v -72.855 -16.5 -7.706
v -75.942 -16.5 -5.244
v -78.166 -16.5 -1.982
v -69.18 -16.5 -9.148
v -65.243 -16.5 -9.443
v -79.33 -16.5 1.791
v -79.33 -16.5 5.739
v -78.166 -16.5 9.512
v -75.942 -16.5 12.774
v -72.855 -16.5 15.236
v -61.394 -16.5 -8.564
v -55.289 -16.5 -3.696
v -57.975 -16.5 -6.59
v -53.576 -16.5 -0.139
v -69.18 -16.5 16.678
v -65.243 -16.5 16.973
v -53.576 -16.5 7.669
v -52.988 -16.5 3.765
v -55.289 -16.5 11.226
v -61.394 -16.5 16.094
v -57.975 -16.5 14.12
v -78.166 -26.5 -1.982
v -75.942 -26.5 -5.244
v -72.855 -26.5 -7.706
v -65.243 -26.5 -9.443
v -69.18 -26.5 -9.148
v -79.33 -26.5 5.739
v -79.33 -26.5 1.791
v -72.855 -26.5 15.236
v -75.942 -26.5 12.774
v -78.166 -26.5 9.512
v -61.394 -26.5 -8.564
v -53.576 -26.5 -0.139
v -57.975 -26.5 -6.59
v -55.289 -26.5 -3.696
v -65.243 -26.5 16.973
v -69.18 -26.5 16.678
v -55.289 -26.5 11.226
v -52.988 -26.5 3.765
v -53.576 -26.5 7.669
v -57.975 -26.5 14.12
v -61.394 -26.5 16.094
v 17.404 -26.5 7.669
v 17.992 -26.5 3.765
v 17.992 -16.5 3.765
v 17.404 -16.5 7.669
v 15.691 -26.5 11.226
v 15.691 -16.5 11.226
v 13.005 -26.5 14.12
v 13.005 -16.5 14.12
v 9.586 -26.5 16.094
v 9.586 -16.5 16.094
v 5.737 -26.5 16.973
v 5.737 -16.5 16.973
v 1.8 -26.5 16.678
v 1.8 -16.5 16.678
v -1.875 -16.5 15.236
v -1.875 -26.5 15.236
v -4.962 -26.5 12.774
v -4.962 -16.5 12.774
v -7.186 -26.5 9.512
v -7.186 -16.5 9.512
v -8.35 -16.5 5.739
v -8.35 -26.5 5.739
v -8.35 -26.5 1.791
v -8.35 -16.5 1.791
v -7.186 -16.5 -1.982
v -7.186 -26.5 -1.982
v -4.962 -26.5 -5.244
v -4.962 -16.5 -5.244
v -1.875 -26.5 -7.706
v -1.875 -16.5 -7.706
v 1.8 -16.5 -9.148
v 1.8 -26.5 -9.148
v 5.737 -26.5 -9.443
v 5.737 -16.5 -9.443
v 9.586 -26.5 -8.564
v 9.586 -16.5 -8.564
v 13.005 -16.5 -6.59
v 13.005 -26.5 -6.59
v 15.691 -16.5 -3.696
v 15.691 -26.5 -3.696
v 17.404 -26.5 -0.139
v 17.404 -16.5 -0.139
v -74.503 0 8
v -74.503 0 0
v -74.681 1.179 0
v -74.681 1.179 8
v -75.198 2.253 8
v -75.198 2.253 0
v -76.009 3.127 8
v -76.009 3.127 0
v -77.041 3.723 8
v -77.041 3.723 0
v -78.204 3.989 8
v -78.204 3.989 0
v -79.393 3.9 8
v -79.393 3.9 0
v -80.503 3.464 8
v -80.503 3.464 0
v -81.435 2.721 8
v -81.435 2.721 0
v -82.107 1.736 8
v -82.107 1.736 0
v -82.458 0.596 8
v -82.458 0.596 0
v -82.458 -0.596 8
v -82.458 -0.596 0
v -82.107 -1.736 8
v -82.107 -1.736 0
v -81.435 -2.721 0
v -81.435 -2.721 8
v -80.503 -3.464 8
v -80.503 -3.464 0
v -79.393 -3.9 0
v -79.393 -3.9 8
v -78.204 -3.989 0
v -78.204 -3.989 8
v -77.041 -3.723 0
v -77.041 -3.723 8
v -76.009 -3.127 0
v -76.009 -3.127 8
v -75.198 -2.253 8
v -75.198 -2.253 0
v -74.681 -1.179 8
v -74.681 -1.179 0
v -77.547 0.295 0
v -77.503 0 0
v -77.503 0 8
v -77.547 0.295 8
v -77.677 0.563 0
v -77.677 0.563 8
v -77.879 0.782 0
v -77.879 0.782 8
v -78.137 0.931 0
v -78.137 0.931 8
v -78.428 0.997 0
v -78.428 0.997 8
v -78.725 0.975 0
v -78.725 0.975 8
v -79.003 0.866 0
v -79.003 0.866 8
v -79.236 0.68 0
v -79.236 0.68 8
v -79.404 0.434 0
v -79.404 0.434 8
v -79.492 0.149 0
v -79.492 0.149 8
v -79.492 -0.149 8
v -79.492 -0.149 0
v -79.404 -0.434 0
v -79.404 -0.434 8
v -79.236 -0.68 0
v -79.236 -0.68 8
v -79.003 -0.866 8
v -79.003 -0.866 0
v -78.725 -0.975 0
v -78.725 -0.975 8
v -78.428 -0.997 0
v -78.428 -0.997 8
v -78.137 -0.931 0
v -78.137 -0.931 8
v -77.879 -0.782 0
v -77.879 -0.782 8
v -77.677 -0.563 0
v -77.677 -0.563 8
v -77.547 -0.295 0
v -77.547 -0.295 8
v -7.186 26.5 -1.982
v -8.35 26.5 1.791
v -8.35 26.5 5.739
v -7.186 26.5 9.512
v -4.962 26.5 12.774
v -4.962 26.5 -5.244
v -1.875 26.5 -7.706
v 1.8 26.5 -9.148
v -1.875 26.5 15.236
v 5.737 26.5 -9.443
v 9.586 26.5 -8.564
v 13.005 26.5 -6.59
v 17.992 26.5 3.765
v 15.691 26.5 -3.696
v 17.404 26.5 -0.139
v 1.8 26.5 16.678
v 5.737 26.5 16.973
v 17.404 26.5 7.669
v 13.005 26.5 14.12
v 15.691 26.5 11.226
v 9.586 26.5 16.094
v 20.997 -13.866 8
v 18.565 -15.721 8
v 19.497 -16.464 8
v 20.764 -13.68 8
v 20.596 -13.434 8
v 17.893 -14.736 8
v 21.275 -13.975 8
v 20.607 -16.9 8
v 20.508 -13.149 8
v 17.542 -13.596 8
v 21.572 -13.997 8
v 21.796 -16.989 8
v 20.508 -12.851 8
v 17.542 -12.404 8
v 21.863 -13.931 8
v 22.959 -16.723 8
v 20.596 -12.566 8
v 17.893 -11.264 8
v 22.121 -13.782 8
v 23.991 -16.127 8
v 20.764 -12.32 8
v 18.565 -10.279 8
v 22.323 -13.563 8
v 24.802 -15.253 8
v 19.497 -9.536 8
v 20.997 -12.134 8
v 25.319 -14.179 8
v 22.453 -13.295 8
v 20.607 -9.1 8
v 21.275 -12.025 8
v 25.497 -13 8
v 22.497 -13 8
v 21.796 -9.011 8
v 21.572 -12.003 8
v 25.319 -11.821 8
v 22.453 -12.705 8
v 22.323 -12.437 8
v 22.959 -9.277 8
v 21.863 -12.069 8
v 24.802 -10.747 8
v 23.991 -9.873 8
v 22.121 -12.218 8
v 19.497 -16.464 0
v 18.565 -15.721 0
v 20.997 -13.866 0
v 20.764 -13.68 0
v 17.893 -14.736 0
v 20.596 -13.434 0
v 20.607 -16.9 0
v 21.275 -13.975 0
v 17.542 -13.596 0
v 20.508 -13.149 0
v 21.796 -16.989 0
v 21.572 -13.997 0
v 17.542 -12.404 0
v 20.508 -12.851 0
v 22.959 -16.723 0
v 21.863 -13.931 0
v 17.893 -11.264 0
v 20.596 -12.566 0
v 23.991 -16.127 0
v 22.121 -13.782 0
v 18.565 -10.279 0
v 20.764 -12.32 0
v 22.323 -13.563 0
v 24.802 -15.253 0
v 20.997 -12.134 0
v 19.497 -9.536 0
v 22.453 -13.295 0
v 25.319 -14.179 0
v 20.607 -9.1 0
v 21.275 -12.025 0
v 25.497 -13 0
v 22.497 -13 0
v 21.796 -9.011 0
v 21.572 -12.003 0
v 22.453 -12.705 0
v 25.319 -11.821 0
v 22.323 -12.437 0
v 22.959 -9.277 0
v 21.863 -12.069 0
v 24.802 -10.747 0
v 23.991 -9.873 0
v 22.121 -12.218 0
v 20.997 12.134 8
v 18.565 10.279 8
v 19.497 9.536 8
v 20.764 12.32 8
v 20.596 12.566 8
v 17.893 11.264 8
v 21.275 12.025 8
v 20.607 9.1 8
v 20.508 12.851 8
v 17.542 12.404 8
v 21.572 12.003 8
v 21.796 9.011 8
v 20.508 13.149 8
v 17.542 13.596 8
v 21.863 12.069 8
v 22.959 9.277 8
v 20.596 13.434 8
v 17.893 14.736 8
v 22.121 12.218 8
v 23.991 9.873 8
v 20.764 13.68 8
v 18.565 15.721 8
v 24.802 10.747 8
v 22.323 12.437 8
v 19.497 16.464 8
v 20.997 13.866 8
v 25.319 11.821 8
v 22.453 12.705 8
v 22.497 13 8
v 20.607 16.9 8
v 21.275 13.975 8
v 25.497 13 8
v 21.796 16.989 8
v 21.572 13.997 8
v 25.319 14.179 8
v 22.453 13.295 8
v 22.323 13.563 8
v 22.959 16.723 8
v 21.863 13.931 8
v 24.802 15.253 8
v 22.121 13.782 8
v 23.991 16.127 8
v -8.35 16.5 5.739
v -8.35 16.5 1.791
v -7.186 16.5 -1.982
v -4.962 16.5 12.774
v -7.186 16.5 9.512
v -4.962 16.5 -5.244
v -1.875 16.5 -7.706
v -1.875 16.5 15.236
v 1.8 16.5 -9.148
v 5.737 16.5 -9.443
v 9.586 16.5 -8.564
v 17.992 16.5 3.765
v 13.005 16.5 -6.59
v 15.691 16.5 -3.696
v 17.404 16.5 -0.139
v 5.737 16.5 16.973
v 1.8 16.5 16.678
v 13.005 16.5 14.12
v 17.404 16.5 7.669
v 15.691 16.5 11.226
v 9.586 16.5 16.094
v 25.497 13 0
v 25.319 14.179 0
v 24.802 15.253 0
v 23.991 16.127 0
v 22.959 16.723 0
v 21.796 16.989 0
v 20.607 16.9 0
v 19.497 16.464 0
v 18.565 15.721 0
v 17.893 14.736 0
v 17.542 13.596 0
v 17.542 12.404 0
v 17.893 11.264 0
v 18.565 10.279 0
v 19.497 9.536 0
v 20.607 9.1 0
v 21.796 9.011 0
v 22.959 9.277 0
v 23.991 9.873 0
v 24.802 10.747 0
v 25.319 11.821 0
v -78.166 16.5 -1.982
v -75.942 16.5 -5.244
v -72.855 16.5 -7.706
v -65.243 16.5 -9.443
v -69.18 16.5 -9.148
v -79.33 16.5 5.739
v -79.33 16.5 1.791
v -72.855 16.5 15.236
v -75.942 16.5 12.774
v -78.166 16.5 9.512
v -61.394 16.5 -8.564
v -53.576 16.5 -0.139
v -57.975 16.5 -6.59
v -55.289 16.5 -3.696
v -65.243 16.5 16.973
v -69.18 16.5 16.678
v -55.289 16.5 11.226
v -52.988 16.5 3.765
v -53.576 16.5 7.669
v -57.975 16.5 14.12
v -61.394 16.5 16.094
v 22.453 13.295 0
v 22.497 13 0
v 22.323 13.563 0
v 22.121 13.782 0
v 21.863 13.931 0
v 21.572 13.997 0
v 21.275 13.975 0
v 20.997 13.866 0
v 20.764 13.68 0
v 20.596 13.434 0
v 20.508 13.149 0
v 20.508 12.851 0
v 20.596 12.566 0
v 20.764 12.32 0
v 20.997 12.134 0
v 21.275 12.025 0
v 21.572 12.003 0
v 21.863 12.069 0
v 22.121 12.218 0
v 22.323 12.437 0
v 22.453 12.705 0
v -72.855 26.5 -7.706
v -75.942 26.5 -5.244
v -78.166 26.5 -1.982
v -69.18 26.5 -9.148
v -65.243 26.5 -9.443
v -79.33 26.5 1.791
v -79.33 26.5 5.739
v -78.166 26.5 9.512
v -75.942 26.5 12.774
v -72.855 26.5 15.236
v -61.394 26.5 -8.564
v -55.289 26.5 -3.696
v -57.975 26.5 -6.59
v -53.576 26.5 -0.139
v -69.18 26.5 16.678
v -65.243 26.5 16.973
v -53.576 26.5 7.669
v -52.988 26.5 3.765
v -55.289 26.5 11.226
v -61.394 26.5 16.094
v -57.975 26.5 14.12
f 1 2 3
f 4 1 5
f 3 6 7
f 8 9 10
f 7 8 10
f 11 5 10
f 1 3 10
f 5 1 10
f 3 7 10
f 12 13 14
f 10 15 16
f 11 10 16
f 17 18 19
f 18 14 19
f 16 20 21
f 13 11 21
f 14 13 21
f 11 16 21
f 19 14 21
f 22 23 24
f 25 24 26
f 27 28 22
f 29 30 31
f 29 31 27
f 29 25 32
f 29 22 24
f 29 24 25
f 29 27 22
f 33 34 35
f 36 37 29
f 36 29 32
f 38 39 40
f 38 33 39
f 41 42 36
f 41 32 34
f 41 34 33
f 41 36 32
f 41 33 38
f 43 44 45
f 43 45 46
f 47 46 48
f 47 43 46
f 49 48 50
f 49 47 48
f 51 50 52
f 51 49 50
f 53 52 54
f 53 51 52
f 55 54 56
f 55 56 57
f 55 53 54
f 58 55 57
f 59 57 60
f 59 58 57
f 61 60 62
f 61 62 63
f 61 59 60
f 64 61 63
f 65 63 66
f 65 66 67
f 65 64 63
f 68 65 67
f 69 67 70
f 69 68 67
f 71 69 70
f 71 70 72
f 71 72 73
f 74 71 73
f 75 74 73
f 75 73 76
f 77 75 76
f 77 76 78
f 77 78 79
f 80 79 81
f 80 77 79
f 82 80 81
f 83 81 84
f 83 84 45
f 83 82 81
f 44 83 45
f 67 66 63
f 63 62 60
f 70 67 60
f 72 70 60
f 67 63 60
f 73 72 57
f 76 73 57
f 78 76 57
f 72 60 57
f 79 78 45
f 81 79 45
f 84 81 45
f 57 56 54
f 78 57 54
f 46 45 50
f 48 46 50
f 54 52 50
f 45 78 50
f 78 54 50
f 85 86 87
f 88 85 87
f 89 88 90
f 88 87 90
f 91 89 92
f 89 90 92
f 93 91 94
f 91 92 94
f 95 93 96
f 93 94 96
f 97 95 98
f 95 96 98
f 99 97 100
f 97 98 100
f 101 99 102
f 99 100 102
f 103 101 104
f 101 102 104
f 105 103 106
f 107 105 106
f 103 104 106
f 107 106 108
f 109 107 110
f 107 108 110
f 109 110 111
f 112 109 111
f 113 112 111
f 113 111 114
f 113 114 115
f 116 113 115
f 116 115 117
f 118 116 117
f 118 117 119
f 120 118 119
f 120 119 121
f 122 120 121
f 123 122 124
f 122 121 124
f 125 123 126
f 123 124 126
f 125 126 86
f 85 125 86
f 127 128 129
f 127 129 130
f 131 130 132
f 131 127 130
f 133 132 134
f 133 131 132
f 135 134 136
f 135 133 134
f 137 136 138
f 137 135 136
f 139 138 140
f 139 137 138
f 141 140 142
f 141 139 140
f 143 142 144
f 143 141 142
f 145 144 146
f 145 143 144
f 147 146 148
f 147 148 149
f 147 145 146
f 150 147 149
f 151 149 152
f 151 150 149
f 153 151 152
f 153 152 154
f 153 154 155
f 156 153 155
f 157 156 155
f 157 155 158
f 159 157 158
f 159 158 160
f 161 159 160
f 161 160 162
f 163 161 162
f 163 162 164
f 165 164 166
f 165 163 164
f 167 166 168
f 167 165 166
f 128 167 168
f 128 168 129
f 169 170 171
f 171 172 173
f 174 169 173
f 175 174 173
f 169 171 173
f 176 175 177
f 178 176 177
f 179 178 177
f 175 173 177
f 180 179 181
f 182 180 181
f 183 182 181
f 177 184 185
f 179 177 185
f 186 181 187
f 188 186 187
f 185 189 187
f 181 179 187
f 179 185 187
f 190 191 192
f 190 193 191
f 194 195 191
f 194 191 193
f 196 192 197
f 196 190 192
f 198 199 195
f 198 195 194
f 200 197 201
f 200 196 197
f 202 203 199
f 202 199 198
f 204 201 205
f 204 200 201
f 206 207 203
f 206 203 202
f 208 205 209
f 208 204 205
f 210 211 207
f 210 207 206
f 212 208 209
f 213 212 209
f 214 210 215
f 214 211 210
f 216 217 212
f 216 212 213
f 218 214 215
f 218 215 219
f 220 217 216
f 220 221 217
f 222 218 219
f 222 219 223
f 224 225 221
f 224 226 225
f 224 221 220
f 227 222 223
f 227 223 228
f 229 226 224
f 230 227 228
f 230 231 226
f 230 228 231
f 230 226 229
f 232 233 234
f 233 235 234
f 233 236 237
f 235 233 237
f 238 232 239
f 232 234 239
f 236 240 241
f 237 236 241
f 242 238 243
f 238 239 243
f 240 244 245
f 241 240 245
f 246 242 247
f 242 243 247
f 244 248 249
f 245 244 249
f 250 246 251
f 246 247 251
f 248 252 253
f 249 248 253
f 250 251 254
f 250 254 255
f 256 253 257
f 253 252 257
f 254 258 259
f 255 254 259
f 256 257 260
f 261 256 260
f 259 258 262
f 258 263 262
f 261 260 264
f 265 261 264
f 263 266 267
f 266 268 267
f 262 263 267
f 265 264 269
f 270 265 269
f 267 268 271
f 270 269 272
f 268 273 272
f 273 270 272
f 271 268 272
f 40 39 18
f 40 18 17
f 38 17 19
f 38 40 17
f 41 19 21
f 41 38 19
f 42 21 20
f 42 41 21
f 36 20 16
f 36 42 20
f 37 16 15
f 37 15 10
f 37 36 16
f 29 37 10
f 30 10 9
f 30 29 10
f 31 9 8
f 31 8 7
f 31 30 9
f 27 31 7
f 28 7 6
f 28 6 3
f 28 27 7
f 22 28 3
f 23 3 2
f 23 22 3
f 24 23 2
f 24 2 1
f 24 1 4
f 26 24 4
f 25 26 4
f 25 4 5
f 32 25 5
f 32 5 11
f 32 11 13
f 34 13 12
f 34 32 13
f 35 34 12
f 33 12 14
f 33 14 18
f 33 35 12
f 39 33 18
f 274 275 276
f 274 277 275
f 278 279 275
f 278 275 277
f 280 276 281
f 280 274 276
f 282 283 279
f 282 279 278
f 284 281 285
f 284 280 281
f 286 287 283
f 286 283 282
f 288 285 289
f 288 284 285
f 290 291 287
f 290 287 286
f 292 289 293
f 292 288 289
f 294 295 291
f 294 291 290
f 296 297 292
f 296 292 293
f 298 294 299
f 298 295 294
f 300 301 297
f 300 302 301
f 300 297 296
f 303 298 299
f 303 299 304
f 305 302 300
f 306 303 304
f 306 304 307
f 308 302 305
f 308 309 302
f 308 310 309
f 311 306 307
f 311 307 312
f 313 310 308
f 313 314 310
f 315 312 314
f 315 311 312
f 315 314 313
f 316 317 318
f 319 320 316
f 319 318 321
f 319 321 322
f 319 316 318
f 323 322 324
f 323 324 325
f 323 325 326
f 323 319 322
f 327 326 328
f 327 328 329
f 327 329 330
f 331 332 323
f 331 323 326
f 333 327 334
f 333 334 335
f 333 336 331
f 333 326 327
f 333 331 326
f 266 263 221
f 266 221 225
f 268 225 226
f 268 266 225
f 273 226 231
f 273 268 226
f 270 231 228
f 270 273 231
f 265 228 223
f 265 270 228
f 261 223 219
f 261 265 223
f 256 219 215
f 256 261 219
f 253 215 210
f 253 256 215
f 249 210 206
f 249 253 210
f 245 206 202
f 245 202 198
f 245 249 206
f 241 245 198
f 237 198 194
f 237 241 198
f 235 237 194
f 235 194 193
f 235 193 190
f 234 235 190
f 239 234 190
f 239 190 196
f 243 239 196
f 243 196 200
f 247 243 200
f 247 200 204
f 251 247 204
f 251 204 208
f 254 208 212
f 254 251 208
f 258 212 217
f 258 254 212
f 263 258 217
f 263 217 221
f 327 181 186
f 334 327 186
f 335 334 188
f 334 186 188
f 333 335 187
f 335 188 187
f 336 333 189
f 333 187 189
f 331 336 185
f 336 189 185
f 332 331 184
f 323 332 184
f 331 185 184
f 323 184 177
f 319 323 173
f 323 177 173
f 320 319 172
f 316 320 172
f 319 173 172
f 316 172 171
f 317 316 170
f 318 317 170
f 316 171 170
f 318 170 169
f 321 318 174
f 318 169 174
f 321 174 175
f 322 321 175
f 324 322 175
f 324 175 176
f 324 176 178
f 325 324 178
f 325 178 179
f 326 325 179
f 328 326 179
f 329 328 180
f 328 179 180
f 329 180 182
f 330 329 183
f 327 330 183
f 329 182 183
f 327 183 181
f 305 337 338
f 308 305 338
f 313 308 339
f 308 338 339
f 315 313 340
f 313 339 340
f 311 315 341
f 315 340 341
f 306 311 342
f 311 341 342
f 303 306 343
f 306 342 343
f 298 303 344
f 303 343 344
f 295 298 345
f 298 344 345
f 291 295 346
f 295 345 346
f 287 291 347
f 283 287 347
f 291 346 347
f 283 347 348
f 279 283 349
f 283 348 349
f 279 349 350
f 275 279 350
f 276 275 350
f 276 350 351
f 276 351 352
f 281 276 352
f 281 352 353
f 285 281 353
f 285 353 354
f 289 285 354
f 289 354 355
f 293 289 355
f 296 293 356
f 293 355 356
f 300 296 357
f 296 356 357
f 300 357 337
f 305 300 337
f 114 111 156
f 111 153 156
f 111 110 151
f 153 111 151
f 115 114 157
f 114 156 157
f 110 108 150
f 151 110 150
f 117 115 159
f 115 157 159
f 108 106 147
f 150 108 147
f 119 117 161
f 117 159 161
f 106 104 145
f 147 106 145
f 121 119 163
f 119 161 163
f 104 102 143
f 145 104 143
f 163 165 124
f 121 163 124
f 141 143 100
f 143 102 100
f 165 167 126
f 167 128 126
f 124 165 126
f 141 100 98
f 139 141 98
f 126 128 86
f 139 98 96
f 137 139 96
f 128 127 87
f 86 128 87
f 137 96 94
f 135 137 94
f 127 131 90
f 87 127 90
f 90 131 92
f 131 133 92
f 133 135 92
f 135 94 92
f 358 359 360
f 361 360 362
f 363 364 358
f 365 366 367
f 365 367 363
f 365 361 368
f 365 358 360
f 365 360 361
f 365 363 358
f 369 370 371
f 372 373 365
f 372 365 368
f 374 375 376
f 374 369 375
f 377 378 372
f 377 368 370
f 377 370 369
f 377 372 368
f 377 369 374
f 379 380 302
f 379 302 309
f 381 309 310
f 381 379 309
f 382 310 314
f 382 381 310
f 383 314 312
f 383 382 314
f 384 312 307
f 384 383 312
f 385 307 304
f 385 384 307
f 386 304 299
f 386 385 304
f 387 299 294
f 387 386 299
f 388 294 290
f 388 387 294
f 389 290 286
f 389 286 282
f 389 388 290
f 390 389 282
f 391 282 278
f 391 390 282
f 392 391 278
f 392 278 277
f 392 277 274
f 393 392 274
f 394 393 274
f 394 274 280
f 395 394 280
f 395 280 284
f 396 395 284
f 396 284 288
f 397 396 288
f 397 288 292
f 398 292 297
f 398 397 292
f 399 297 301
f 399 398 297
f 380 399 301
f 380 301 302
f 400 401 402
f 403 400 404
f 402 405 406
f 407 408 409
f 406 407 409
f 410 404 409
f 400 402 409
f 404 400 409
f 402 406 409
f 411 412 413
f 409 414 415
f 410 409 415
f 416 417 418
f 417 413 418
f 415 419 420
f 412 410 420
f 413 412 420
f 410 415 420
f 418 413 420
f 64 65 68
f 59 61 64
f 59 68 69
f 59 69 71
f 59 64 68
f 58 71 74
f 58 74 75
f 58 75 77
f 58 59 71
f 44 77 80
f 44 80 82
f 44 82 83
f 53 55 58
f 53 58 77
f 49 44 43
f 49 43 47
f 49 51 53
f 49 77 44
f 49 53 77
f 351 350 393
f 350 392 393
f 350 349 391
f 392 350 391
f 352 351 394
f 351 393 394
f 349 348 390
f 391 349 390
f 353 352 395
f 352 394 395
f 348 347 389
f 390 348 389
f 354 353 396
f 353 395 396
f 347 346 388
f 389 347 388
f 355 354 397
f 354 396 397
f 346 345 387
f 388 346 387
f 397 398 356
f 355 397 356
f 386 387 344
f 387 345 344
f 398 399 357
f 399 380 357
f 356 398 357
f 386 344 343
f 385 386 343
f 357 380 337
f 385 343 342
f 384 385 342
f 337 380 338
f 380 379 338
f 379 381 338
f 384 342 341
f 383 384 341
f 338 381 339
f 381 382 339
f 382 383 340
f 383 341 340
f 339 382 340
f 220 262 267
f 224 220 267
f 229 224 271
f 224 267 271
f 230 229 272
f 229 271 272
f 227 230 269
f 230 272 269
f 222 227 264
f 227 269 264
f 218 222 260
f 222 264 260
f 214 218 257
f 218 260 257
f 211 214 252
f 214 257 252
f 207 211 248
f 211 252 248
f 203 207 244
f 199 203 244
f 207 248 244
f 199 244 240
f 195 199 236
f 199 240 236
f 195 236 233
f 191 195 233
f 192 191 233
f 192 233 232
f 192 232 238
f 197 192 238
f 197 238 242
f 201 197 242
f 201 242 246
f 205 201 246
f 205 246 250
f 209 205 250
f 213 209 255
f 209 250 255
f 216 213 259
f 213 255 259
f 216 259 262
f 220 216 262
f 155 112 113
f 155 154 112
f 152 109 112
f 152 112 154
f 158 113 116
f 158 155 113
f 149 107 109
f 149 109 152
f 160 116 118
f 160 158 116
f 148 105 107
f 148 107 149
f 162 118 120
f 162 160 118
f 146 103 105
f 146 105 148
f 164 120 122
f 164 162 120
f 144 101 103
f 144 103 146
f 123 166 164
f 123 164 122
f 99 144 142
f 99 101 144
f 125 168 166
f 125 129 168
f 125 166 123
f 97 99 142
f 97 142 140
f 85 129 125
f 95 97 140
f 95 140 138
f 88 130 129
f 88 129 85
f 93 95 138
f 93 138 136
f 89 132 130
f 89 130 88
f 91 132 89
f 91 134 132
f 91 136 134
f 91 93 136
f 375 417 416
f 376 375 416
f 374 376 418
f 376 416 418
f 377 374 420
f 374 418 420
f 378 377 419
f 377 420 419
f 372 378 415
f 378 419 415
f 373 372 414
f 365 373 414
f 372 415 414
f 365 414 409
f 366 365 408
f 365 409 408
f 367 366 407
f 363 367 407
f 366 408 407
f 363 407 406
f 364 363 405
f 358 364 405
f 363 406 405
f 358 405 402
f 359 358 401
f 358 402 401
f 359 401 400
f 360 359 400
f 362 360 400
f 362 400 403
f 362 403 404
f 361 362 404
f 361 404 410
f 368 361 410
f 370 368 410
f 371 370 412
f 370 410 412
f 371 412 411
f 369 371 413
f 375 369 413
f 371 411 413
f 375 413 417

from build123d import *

# Parameters (mm, degrees)
F0_R     = 4
F0_R_2   = 1
F1_DEPTH = 8
F3_R     = 13.245
F4_DEPTH = 10


with BuildPart() as f1:
    # F0 (on Top) → F1 (new body)
    with BuildSketch(Plane.XY):
        with Locations((-78.502798, 0)):
            Circle(F0_R)
        with Locations((-78.502798, 0)):
            Circle(F0_R_2, mode=Mode.SUBTRACT)
        with Locations((21.497202, 13)):
            Circle(F0_R)
        with Locations((21.497202, 13)):
            Circle(F0_R_2, mode=Mode.SUBTRACT)
        with Locations((21.497202, -13)):
            Circle(F0_R)
        with Locations((21.497202, -13)):
            Circle(F0_R_2, mode=Mode.SUBTRACT)
    extrude(amount=F1_DEPTH)


with BuildPart() as f4:
    # F3 (on offset) → F4 (new body)
    with BuildSketch(Plane.XZ.offset(26.5)):
        with Locations((-66.232798, 3.765)):
            Circle(F3_R)
        with Locations((4.747202, 3.765)):
            Circle(F3_R)
    extrude(amount=-F4_DEPTH)


with BuildPart() as f5_1:
    # F5: instance of F4
    add(f4.part.mirror(Plane.XZ))


solid = Compound([f1.part, f4.part, f5_1.part])
